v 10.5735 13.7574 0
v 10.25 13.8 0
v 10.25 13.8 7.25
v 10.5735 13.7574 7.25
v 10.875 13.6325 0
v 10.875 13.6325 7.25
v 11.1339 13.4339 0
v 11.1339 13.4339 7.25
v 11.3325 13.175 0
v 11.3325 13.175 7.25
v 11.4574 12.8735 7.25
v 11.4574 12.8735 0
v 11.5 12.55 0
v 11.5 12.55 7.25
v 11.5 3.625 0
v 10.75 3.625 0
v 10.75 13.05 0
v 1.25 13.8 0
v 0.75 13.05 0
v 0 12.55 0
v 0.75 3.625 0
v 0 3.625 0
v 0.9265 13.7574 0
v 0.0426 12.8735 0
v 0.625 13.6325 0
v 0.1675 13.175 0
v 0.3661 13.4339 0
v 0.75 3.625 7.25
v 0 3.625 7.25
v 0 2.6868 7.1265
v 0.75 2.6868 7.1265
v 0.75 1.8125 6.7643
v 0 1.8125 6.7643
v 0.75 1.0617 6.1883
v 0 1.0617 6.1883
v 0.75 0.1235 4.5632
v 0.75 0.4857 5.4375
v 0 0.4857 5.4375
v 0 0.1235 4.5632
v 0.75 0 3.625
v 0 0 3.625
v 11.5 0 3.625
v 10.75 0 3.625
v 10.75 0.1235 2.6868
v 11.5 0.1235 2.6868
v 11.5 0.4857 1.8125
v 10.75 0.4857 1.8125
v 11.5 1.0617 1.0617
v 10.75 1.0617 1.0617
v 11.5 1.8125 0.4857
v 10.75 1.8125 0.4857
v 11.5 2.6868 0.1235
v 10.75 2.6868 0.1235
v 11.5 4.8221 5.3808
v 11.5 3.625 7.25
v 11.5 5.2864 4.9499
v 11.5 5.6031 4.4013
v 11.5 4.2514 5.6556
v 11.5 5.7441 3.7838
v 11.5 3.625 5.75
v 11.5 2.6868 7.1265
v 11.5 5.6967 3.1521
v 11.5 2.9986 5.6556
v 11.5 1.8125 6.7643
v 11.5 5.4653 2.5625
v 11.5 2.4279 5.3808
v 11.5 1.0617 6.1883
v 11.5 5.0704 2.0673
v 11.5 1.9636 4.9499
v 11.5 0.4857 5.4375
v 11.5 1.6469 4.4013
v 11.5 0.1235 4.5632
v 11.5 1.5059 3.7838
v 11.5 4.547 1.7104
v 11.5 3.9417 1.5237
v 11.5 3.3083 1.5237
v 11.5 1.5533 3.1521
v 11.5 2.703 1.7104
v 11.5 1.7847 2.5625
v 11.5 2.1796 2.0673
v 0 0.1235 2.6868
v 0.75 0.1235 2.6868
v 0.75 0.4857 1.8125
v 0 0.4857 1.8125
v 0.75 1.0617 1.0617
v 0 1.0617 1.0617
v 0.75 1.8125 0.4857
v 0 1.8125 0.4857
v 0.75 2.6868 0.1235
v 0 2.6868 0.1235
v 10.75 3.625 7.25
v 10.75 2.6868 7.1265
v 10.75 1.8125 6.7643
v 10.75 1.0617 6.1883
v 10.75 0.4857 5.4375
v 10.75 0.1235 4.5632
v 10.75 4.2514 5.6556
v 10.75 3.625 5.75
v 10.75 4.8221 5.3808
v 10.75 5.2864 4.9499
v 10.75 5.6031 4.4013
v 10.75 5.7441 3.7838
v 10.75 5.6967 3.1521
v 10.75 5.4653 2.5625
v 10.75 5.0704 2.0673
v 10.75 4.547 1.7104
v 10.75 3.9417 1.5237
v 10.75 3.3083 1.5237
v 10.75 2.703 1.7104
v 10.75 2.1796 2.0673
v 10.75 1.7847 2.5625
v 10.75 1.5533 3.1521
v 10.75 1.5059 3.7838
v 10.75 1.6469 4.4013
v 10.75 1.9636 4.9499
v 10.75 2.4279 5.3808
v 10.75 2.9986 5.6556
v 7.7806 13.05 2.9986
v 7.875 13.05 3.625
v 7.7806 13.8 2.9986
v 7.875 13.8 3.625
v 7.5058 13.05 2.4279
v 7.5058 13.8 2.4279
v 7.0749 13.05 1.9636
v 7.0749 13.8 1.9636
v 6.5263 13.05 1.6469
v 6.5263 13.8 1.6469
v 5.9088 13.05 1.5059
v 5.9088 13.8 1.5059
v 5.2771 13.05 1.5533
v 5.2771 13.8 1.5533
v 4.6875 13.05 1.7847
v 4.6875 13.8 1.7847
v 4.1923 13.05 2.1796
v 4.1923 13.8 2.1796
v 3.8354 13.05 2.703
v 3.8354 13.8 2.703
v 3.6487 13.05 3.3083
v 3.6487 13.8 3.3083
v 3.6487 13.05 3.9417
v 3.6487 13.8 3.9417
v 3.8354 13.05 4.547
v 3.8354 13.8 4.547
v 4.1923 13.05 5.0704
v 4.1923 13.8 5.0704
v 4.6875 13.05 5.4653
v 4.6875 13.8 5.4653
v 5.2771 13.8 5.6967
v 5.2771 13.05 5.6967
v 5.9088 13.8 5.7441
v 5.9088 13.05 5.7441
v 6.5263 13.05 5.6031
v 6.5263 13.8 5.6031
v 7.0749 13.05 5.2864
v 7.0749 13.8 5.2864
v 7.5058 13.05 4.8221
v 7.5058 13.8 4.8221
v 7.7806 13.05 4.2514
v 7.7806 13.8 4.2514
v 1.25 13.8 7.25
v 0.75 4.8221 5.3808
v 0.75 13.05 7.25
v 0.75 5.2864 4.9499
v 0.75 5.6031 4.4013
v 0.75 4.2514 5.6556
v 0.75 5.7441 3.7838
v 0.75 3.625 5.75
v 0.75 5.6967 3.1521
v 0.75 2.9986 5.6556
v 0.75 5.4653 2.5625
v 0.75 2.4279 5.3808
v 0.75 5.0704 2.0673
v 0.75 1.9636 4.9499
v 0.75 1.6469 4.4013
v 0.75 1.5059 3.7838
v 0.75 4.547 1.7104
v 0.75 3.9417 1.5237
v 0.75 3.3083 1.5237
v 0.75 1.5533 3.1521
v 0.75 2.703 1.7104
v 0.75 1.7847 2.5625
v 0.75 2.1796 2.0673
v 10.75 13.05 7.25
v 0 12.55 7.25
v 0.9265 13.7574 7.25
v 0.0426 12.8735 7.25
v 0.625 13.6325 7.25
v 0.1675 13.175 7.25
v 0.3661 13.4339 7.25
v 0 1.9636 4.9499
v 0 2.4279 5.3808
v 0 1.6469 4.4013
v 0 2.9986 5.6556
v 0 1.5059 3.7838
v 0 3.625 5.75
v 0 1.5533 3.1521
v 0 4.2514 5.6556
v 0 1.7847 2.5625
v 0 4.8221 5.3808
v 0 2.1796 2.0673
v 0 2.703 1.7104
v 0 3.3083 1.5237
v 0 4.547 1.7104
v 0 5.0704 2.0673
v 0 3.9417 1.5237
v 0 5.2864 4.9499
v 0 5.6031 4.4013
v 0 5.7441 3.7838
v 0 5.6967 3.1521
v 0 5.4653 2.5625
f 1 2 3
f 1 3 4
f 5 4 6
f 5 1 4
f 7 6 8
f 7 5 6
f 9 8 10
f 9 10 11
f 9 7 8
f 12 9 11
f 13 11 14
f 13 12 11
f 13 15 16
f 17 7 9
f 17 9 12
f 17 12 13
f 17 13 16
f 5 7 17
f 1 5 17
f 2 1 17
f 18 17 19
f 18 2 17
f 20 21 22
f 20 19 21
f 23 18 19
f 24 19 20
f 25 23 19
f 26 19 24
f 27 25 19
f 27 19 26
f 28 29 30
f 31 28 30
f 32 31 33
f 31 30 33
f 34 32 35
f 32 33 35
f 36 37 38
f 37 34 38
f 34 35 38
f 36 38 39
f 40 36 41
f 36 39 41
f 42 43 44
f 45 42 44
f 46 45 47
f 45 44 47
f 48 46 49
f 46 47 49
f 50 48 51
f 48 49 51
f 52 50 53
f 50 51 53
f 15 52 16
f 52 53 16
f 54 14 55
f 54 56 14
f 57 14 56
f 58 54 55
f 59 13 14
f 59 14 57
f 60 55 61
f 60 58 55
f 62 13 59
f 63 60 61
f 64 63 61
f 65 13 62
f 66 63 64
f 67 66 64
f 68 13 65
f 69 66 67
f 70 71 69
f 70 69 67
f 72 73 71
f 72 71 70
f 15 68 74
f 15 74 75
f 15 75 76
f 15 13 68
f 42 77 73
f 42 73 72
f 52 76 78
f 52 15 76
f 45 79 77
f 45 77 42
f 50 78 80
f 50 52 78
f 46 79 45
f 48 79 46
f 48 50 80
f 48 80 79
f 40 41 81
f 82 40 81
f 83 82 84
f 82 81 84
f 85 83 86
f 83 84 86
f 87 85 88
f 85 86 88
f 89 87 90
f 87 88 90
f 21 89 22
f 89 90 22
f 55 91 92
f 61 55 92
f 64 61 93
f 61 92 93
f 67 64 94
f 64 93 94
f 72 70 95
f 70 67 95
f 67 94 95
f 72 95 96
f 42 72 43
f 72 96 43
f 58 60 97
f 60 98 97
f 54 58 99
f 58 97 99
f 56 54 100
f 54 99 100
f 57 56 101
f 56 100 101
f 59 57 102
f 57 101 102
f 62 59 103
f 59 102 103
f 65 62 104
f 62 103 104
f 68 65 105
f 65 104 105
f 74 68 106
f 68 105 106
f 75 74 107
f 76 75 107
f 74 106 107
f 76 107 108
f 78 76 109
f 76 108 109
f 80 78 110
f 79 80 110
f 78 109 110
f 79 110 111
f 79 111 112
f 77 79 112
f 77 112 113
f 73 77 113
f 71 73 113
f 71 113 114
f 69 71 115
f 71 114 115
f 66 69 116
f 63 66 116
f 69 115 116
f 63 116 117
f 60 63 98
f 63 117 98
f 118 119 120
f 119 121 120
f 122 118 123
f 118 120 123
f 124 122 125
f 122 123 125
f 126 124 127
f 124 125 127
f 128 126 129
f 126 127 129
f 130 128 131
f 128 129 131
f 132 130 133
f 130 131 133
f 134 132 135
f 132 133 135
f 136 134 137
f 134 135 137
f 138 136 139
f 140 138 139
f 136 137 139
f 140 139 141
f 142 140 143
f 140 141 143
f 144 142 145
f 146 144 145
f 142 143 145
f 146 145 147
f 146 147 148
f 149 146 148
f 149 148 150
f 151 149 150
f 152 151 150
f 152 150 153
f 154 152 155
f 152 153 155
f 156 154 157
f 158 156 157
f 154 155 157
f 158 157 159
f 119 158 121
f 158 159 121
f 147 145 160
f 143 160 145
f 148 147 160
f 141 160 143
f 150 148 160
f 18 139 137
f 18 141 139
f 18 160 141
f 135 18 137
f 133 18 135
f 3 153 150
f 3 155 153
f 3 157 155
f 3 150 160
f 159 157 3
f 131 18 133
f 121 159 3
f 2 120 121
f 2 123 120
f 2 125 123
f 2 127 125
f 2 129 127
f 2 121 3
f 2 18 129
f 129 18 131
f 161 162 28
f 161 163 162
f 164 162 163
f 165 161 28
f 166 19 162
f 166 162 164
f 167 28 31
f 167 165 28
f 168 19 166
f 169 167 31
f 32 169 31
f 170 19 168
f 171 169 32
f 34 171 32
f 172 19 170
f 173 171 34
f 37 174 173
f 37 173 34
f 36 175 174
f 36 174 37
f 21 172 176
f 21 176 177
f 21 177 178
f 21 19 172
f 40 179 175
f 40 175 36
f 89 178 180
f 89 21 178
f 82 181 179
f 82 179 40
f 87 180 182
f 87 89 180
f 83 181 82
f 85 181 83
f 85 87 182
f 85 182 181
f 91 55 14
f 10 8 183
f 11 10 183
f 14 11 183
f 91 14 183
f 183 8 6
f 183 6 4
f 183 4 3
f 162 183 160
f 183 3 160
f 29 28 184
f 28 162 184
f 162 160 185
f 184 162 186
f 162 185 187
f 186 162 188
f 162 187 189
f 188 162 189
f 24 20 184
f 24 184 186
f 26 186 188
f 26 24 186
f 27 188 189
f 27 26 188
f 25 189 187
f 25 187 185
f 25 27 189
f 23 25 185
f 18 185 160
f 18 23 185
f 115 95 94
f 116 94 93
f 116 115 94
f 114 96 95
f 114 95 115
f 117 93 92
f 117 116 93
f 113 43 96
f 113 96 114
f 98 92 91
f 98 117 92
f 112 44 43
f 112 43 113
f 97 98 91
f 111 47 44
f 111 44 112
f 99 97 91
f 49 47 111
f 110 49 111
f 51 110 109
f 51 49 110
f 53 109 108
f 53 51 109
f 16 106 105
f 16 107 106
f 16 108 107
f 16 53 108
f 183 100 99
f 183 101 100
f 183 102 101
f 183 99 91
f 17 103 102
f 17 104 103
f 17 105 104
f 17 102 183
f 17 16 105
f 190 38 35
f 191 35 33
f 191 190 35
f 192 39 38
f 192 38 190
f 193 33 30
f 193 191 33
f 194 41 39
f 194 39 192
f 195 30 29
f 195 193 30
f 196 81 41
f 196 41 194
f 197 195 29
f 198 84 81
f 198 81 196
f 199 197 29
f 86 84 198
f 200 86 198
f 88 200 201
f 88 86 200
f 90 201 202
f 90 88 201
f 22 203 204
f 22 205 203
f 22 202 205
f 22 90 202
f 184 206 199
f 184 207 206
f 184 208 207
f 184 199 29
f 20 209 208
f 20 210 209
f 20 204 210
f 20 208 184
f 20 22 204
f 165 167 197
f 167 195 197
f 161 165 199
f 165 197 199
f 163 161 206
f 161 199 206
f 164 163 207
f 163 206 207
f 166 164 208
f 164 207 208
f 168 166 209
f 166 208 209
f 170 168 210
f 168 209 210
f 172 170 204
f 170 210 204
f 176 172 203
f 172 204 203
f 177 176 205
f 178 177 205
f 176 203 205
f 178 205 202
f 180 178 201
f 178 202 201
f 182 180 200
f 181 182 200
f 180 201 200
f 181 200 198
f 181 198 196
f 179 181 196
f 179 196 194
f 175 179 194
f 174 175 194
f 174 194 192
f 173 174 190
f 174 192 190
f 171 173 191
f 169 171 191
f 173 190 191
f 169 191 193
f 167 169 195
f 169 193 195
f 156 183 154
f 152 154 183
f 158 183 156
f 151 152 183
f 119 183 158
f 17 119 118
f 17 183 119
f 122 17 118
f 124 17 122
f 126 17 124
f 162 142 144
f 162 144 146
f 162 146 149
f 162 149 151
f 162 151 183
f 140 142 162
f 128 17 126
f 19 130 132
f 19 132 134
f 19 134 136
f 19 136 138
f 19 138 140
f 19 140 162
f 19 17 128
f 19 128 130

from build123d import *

# Parameters (mm, degrees)
BOSS_EXTRUDE1_DEPTH = 7.25
CUT_EXTRUDE1_DEPTH  = 50
CUT_EXTRUDE2_DEPTH  = 50
SKETCH2_4_R         = 2.125
CUT_EXTRUDE3_DEPTH  = 50
SKETCH6_R           = 2.125
CUT_EXTRUDE4_DEPTH  = 50


with BuildPart() as part:
    # Sketch1 → Boss-Extrude1 (new body)
    with BuildSketch(Plane.XY):
        with BuildLine():
            Line((0, 0), (0, 12.55))
            ThreePointArc((0, 12.55), (0.366116524, 13.433883476), (1.25, 13.8))
            Line((1.25, 13.8), (10.25, 13.8))
            ThreePointArc((10.25, 13.8), (11.133883476, 13.433883476), (11.5, 12.55))
            Line((11.5, 12.55), (11.5, 0))
            Line((11.5, 0), (10.75, 0))
            Line((10.75, 0), (10.75, 13.05))
            Line((10.75, 13.05), (0.75, 13.05))
            Line((0.75, 13.05), (0.75, 0))
            Line((0.75, 0), (0, 0))
        make_face()
    extrude(amount=BOSS_EXTRUDE1_DEPTH)

    # Sketch2 → Cut-Extrude1 (cut, symmetric)
    with BuildSketch(Plane.ZY):
        with BuildLine():
            Line((0, 0), (3.625, 0))
            ThreePointArc((3.625, 0), (1.061737918, 1.061737918), (0, 3.625))
            Line((0, 3.625), (0, 0))
        make_face()
    extrude(amount=CUT_EXTRUDE1_DEPTH, both=True, mode=Mode.SUBTRACT)

    # Sketch2<3> → Cut-Extrude2 (cut, symmetric)
    with BuildSketch(Plane.ZY):
        with BuildLine():
            ThreePointArc((7.25, 3.625), (6.188262082, 1.061737918), (3.625, 0))
            Line((3.625, 0), (7.25, 0))
            Line((7.25, 0), (7.25, 3.625))
        make_face()
    extrude(amount=CUT_EXTRUDE2_DEPTH, both=True, mode=Mode.SUBTRACT)

    # Sketch2<4> → Cut-Extrude3 (cut, symmetric)
    with BuildSketch(Plane.ZY):
        with Locations((3.625, 3.625)):
            Circle(SKETCH2_4_R)
    extrude(amount=CUT_EXTRUDE3_DEPTH, both=True, mode=Mode.SUBTRACT)

    # Sketch6 → Cut-Extrude4 (cut, symmetric)
    with BuildSketch(Plane(origin=(0, 13.8, 0), x_dir=(1, 0, 0), z_dir=(0, 1, 0))):
        with Locations((5.75, -3.625)):
            Circle(SKETCH6_R)
    extrude(amount=CUT_EXTRUDE4_DEPTH, both=True, mode=Mode.SUBTRACT)


solid = part.part
